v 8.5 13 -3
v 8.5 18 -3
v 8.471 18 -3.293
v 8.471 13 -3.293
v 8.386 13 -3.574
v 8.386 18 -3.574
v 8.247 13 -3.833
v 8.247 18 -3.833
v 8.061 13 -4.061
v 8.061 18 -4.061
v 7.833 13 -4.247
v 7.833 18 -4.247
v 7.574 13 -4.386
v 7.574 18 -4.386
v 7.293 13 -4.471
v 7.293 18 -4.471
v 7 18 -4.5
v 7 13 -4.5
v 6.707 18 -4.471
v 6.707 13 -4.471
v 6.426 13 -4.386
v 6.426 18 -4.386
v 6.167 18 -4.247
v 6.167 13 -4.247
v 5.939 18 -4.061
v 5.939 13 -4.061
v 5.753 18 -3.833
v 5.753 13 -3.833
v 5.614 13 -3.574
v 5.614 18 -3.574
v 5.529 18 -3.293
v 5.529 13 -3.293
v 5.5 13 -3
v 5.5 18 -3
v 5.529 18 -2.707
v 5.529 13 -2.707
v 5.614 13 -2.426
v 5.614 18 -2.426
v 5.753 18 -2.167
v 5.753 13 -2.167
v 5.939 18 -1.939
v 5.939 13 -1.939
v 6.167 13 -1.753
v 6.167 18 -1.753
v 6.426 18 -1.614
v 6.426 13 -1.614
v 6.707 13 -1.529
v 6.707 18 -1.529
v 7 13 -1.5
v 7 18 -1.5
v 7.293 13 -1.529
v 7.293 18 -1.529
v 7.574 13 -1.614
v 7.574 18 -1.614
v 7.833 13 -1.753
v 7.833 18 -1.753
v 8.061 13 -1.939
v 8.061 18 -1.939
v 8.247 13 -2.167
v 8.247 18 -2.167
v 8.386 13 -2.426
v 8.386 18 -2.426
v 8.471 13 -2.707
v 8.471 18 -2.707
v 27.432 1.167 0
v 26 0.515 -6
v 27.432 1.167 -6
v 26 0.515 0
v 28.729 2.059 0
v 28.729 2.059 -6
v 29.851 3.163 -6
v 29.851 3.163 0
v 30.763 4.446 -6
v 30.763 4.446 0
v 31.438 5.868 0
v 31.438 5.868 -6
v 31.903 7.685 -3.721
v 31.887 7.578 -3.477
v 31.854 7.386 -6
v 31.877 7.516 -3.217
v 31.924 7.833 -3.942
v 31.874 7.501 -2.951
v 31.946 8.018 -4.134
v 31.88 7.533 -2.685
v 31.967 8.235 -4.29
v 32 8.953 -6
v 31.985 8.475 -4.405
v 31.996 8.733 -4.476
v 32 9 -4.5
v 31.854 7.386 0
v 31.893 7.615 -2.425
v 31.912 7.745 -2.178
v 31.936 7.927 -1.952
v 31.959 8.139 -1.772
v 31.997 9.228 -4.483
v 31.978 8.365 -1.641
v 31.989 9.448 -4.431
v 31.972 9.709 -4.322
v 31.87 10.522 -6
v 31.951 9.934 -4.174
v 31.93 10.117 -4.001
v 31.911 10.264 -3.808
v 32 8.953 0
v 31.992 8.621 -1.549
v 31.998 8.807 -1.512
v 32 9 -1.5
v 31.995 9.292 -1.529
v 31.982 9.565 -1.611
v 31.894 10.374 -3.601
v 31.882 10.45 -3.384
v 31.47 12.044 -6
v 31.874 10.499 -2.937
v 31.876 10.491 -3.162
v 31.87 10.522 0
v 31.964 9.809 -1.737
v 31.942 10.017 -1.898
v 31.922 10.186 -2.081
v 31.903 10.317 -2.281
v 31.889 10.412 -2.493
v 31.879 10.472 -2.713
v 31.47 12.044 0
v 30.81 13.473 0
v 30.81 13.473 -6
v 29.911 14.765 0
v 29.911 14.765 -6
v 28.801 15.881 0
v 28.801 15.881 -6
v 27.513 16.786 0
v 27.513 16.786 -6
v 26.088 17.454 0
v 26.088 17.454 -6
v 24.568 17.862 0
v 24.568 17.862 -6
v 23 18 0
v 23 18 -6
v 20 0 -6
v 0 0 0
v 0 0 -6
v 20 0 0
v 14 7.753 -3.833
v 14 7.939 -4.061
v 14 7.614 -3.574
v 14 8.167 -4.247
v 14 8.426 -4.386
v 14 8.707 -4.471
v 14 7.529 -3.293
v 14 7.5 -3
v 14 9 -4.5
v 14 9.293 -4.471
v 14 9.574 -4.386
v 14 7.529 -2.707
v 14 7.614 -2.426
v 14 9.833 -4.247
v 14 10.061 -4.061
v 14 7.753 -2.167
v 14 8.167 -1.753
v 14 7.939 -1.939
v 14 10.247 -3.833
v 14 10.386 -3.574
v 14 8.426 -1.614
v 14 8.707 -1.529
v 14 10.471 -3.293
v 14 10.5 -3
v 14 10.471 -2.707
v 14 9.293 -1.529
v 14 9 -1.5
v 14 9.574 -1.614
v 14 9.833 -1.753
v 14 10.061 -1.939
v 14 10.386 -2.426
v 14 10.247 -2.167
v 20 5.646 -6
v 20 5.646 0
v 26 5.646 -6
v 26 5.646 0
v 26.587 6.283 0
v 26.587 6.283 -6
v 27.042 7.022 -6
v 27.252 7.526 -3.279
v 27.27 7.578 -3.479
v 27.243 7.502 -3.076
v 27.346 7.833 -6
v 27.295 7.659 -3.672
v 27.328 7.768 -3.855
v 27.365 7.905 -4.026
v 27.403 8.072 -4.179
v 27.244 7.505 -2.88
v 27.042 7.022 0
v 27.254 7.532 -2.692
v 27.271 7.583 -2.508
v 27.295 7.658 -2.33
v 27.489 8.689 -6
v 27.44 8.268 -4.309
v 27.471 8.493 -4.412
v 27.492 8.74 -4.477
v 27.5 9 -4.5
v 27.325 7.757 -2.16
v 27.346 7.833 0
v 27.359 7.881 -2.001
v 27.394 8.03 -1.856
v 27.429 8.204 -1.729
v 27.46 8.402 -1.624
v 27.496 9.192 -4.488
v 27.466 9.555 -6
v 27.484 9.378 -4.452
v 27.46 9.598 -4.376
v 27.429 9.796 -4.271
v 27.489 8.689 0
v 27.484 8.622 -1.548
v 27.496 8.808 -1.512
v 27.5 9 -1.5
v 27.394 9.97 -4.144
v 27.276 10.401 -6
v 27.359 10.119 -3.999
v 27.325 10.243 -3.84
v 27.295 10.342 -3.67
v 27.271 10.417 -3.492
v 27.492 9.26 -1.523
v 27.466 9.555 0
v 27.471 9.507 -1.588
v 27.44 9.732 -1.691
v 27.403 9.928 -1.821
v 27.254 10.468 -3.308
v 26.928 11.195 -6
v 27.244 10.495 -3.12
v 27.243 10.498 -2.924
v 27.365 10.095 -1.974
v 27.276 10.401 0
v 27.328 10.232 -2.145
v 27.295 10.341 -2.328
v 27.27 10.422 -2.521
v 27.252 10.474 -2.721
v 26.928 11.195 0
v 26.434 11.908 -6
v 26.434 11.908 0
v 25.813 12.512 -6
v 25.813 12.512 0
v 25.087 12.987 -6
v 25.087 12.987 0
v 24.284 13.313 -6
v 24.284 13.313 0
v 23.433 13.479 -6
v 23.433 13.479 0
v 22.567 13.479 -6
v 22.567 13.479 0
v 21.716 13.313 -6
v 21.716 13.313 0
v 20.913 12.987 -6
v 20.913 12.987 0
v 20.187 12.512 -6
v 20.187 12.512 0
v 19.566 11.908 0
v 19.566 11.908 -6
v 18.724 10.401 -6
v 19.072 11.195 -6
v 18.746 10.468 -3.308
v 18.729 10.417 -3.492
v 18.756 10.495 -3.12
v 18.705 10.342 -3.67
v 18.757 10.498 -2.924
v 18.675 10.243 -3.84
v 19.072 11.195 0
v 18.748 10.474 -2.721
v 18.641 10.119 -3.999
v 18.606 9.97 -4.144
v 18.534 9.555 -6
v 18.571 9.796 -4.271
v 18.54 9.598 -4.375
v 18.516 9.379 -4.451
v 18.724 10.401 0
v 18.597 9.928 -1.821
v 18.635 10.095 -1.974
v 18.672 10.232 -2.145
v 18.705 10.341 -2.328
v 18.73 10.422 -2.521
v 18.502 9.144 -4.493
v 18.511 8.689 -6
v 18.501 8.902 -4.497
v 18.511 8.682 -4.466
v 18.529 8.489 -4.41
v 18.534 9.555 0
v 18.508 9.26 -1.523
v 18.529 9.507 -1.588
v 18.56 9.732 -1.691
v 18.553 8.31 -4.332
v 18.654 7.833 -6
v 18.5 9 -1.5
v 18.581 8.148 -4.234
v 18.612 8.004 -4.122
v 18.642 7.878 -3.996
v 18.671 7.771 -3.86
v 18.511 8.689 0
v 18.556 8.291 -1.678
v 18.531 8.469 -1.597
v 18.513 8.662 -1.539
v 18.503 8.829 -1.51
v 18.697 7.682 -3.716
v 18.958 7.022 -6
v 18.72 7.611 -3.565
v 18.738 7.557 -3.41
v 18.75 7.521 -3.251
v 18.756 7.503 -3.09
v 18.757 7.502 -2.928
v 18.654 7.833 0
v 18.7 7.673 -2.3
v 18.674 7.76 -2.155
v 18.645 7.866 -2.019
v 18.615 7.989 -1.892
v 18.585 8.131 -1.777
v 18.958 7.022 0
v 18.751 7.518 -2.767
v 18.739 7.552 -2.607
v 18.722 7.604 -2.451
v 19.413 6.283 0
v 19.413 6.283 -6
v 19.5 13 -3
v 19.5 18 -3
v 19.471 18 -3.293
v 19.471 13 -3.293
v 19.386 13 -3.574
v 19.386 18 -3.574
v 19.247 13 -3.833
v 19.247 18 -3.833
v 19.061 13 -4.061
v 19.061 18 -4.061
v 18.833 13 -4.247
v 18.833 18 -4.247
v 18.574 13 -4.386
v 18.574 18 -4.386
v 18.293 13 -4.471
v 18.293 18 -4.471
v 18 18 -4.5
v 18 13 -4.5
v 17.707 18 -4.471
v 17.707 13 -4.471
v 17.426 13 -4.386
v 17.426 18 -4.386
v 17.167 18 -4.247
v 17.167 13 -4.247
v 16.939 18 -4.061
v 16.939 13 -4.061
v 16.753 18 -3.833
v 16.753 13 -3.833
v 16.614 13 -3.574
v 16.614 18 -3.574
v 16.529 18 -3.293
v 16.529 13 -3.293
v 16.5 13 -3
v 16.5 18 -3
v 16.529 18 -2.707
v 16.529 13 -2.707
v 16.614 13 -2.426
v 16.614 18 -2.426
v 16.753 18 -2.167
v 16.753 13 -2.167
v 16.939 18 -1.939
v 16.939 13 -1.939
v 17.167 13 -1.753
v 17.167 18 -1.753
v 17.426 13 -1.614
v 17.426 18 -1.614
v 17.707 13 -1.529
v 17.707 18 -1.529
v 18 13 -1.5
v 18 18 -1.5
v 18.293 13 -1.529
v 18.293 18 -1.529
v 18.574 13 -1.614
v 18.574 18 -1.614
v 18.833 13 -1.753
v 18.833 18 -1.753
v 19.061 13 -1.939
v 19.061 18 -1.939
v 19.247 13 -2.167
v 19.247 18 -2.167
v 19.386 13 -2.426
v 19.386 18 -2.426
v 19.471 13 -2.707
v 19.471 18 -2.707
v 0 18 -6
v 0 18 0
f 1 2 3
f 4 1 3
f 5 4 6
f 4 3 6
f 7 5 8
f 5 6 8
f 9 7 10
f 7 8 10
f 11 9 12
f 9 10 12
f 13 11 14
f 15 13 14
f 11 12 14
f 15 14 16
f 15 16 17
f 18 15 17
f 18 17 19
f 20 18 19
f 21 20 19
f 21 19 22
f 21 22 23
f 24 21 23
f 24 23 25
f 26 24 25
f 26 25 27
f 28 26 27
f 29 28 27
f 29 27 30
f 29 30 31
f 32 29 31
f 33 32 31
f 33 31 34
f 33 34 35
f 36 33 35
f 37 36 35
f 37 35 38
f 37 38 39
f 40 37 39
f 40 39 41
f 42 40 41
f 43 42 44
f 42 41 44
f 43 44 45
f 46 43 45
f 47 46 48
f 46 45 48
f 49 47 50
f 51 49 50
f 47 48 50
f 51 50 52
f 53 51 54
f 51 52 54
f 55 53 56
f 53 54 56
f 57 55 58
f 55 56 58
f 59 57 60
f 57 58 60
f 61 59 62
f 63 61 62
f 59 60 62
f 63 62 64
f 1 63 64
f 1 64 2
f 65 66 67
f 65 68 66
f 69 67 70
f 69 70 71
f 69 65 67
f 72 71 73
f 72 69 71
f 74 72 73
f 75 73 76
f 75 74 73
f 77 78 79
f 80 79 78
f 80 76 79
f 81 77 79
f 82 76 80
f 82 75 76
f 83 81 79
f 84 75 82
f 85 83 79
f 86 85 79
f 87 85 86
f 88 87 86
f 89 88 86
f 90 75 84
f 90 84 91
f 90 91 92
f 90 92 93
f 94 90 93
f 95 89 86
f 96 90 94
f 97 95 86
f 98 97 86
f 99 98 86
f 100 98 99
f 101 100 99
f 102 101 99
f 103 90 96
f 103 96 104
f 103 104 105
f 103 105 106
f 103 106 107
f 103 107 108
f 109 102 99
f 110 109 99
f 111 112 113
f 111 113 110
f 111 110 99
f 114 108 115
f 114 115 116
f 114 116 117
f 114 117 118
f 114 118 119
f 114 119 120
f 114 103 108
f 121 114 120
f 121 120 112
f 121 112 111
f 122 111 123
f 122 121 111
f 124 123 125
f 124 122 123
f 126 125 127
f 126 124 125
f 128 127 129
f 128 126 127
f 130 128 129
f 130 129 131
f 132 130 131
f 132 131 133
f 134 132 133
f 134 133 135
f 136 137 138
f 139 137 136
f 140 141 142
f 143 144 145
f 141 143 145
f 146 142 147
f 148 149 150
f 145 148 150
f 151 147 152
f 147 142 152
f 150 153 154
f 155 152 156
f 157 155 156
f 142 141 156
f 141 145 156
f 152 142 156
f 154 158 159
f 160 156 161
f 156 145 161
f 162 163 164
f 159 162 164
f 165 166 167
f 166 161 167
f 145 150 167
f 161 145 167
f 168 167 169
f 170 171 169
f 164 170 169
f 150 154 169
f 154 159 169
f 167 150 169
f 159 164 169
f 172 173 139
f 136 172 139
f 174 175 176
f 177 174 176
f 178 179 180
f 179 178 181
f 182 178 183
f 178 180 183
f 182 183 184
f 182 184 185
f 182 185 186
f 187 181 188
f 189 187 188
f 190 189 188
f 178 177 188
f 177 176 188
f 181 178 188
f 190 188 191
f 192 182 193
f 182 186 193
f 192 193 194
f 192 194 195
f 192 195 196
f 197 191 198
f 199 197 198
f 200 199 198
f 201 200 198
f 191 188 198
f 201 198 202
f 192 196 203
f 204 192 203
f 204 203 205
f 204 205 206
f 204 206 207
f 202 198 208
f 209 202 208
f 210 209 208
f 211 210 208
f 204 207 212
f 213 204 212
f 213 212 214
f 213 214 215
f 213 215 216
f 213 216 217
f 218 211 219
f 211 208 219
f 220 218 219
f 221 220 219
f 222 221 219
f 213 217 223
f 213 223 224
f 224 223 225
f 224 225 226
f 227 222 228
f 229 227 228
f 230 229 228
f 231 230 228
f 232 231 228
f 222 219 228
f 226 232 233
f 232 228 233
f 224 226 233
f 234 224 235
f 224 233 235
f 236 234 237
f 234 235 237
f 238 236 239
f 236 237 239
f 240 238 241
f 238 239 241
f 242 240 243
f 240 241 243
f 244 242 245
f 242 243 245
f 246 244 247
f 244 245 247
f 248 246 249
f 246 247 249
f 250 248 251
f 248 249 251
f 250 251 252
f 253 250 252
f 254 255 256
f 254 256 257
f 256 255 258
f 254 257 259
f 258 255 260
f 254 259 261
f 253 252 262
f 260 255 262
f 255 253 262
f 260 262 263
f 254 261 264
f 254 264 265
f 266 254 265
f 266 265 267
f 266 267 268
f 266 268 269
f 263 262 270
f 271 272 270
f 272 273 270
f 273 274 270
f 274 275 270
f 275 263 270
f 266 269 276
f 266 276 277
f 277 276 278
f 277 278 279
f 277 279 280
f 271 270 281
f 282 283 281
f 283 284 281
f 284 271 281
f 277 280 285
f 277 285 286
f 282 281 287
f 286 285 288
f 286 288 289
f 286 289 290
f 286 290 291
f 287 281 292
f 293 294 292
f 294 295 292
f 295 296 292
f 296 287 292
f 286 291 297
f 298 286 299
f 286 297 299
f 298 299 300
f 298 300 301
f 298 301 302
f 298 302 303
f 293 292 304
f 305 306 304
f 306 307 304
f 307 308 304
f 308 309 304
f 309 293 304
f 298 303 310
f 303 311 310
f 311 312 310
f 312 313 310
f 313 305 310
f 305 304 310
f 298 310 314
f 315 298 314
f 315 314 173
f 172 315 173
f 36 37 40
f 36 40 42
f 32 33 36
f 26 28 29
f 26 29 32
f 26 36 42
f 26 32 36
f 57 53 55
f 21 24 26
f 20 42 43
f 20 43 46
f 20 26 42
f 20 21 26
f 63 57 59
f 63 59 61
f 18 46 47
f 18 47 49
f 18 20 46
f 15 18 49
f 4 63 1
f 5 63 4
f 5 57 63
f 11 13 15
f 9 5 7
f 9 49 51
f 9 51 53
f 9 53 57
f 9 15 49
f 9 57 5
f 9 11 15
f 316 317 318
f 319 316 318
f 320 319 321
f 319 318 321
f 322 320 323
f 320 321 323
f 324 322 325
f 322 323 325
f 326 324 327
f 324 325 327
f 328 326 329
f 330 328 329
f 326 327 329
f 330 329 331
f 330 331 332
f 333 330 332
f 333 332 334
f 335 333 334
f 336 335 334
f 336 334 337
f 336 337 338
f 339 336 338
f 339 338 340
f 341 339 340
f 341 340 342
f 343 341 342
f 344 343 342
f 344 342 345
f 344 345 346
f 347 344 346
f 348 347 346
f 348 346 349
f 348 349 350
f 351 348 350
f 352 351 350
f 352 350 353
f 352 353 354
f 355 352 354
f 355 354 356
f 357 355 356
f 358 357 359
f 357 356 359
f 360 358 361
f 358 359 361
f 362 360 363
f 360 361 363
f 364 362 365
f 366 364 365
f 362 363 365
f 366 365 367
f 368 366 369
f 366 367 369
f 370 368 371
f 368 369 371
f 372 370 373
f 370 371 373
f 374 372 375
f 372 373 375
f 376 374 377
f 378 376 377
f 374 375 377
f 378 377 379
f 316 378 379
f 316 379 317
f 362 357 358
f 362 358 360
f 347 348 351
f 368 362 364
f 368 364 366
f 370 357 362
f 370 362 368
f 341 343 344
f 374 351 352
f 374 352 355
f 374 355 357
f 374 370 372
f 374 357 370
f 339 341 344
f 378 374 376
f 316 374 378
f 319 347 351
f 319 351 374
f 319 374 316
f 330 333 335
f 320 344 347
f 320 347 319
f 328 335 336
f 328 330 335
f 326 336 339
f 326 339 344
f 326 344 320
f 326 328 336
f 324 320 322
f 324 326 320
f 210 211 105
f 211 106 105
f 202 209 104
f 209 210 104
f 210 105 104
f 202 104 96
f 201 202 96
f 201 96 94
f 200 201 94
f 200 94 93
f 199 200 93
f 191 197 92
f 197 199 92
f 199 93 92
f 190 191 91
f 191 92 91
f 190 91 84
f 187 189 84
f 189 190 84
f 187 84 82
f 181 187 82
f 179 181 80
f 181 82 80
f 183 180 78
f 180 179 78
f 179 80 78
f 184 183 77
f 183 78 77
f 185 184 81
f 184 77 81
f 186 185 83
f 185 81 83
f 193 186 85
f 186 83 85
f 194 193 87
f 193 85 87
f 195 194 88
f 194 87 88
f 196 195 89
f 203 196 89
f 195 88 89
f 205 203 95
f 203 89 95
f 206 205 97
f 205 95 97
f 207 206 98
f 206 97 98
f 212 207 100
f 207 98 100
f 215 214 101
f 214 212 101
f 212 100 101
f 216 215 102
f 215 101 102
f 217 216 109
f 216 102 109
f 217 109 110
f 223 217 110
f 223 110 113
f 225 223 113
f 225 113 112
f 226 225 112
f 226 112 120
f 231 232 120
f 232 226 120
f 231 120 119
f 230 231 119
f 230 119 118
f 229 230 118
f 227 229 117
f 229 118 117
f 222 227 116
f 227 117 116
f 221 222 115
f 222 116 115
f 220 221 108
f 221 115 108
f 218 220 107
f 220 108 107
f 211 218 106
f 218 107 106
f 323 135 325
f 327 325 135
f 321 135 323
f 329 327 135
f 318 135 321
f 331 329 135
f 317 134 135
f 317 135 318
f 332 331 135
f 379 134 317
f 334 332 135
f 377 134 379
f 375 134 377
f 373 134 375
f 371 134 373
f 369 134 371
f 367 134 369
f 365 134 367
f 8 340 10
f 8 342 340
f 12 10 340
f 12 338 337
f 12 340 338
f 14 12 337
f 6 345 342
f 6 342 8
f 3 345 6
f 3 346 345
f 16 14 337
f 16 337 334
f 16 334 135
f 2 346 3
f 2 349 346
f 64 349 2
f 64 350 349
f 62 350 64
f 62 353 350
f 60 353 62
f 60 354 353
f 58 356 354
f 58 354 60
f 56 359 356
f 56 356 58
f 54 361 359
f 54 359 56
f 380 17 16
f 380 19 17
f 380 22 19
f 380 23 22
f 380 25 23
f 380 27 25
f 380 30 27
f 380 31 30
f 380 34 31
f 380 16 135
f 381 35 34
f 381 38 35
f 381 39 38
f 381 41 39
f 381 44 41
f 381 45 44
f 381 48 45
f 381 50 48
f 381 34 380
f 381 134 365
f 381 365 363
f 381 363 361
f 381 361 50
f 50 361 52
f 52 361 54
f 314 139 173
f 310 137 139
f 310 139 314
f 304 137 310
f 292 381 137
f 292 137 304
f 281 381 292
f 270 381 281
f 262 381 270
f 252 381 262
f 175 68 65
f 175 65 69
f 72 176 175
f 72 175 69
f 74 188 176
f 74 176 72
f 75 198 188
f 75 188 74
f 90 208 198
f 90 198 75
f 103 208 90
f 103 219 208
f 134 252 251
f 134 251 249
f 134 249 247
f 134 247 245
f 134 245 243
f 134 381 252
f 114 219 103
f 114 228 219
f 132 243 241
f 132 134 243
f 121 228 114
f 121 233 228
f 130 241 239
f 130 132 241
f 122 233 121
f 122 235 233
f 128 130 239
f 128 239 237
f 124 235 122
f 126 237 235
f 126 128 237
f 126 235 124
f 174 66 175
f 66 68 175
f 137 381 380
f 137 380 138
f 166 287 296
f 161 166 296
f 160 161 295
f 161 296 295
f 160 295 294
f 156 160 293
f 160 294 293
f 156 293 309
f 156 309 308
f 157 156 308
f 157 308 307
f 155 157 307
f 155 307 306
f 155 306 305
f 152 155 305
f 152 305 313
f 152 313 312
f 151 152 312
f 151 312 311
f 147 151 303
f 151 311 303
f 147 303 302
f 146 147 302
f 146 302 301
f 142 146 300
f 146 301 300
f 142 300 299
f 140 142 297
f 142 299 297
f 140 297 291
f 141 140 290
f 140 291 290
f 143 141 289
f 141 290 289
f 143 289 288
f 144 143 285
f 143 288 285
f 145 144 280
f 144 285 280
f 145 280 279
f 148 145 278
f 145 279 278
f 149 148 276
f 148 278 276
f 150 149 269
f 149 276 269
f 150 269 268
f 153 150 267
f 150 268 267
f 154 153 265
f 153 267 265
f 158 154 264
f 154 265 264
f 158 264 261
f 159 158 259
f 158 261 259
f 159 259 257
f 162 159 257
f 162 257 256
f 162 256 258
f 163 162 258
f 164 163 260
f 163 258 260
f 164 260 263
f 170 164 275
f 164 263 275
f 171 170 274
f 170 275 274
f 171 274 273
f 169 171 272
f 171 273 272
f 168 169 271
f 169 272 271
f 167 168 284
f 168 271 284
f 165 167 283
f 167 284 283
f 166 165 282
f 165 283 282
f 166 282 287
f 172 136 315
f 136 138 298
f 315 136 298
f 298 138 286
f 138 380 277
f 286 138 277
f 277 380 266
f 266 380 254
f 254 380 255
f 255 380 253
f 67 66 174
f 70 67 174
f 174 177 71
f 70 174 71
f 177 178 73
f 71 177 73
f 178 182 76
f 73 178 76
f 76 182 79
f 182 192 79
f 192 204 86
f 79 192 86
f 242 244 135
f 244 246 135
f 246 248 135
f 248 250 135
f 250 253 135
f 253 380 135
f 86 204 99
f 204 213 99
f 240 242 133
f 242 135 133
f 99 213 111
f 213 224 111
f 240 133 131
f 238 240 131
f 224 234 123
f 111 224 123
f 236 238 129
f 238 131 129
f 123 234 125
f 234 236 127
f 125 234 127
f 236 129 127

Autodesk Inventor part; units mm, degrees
ref_plane "YZ Plane" through (0, 0, 0) normal (1, 0, 0) x (0, 1, 0)
ref_plane "XZ Plane" through (0, 0, 0) normal (0, 1, 0) x (-1, 0, 0)
sketch "Sketch1" plane through (0, 0, 0) normal (0, 0, 1) x (1, 0, 0)
  line L0 (0, 0) -> (23, 0)
  arc A0 (23, 0) -> (23, 18) centre (23, 9) ccw
  line L1 (23, 18) -> (0, 18)
  line L2 (0, 18) -> (0, 0)
  circle A1 centre (23, 9) radius 4.5
  dimension "d0" = 23
  dimension "d1" = 18
  dimension "d2" = 9
  dimension "d3" = 9
extrude "Extrusion1" add sketch "Sketch1" against normal blind 6
sketch "Sketch2" plane through (0, 18, 0) normal (0, 1, 0) x (1, 0, 0)
  circle A0 centre (18, 3) radius 1.5
  circle A1 centre (7, 3) radius 1.5
  point P0 (0, 0)
  dimension "d6" = 3
  dimension "d7" = 3
extrude "Extrusion2" cut sketch "Sketch2" against normal blind 5
sketch "Sketch3" plane through (0, 0, 0) normal (0, 0, 1) x (1, 0, 0)
  line L0 (20, 0) -> (26, 0)
  line L1 (26, 0) -> (26, 6)
  line L2 (26, 6) -> (20, 6)
  line L3 (20, 6) -> (20, 0)
  point P0 (0, 0)
  dimension "d10" = 6
  dimension "d11" = 6
extrude "Extrusion3" cut sketch "Sketch3" against normal through all
ref_plane "Work Plane1" through (32, 0, 0) normal (-1, 0, 0) x (0, 0, 1)
sketch "Sketch4" plane through (32, 0, 0) normal (-1, 0, 0) x (0, 0, 1)
  circle A0 centre (-3, 9) radius 1.5
  point P0 (0, 0)
  dimension "d15" = 3
extrude "Extrusion4" cut sketch "Sketch4" along normal blind 18
properties part number "Hand - Digit 2-3"
